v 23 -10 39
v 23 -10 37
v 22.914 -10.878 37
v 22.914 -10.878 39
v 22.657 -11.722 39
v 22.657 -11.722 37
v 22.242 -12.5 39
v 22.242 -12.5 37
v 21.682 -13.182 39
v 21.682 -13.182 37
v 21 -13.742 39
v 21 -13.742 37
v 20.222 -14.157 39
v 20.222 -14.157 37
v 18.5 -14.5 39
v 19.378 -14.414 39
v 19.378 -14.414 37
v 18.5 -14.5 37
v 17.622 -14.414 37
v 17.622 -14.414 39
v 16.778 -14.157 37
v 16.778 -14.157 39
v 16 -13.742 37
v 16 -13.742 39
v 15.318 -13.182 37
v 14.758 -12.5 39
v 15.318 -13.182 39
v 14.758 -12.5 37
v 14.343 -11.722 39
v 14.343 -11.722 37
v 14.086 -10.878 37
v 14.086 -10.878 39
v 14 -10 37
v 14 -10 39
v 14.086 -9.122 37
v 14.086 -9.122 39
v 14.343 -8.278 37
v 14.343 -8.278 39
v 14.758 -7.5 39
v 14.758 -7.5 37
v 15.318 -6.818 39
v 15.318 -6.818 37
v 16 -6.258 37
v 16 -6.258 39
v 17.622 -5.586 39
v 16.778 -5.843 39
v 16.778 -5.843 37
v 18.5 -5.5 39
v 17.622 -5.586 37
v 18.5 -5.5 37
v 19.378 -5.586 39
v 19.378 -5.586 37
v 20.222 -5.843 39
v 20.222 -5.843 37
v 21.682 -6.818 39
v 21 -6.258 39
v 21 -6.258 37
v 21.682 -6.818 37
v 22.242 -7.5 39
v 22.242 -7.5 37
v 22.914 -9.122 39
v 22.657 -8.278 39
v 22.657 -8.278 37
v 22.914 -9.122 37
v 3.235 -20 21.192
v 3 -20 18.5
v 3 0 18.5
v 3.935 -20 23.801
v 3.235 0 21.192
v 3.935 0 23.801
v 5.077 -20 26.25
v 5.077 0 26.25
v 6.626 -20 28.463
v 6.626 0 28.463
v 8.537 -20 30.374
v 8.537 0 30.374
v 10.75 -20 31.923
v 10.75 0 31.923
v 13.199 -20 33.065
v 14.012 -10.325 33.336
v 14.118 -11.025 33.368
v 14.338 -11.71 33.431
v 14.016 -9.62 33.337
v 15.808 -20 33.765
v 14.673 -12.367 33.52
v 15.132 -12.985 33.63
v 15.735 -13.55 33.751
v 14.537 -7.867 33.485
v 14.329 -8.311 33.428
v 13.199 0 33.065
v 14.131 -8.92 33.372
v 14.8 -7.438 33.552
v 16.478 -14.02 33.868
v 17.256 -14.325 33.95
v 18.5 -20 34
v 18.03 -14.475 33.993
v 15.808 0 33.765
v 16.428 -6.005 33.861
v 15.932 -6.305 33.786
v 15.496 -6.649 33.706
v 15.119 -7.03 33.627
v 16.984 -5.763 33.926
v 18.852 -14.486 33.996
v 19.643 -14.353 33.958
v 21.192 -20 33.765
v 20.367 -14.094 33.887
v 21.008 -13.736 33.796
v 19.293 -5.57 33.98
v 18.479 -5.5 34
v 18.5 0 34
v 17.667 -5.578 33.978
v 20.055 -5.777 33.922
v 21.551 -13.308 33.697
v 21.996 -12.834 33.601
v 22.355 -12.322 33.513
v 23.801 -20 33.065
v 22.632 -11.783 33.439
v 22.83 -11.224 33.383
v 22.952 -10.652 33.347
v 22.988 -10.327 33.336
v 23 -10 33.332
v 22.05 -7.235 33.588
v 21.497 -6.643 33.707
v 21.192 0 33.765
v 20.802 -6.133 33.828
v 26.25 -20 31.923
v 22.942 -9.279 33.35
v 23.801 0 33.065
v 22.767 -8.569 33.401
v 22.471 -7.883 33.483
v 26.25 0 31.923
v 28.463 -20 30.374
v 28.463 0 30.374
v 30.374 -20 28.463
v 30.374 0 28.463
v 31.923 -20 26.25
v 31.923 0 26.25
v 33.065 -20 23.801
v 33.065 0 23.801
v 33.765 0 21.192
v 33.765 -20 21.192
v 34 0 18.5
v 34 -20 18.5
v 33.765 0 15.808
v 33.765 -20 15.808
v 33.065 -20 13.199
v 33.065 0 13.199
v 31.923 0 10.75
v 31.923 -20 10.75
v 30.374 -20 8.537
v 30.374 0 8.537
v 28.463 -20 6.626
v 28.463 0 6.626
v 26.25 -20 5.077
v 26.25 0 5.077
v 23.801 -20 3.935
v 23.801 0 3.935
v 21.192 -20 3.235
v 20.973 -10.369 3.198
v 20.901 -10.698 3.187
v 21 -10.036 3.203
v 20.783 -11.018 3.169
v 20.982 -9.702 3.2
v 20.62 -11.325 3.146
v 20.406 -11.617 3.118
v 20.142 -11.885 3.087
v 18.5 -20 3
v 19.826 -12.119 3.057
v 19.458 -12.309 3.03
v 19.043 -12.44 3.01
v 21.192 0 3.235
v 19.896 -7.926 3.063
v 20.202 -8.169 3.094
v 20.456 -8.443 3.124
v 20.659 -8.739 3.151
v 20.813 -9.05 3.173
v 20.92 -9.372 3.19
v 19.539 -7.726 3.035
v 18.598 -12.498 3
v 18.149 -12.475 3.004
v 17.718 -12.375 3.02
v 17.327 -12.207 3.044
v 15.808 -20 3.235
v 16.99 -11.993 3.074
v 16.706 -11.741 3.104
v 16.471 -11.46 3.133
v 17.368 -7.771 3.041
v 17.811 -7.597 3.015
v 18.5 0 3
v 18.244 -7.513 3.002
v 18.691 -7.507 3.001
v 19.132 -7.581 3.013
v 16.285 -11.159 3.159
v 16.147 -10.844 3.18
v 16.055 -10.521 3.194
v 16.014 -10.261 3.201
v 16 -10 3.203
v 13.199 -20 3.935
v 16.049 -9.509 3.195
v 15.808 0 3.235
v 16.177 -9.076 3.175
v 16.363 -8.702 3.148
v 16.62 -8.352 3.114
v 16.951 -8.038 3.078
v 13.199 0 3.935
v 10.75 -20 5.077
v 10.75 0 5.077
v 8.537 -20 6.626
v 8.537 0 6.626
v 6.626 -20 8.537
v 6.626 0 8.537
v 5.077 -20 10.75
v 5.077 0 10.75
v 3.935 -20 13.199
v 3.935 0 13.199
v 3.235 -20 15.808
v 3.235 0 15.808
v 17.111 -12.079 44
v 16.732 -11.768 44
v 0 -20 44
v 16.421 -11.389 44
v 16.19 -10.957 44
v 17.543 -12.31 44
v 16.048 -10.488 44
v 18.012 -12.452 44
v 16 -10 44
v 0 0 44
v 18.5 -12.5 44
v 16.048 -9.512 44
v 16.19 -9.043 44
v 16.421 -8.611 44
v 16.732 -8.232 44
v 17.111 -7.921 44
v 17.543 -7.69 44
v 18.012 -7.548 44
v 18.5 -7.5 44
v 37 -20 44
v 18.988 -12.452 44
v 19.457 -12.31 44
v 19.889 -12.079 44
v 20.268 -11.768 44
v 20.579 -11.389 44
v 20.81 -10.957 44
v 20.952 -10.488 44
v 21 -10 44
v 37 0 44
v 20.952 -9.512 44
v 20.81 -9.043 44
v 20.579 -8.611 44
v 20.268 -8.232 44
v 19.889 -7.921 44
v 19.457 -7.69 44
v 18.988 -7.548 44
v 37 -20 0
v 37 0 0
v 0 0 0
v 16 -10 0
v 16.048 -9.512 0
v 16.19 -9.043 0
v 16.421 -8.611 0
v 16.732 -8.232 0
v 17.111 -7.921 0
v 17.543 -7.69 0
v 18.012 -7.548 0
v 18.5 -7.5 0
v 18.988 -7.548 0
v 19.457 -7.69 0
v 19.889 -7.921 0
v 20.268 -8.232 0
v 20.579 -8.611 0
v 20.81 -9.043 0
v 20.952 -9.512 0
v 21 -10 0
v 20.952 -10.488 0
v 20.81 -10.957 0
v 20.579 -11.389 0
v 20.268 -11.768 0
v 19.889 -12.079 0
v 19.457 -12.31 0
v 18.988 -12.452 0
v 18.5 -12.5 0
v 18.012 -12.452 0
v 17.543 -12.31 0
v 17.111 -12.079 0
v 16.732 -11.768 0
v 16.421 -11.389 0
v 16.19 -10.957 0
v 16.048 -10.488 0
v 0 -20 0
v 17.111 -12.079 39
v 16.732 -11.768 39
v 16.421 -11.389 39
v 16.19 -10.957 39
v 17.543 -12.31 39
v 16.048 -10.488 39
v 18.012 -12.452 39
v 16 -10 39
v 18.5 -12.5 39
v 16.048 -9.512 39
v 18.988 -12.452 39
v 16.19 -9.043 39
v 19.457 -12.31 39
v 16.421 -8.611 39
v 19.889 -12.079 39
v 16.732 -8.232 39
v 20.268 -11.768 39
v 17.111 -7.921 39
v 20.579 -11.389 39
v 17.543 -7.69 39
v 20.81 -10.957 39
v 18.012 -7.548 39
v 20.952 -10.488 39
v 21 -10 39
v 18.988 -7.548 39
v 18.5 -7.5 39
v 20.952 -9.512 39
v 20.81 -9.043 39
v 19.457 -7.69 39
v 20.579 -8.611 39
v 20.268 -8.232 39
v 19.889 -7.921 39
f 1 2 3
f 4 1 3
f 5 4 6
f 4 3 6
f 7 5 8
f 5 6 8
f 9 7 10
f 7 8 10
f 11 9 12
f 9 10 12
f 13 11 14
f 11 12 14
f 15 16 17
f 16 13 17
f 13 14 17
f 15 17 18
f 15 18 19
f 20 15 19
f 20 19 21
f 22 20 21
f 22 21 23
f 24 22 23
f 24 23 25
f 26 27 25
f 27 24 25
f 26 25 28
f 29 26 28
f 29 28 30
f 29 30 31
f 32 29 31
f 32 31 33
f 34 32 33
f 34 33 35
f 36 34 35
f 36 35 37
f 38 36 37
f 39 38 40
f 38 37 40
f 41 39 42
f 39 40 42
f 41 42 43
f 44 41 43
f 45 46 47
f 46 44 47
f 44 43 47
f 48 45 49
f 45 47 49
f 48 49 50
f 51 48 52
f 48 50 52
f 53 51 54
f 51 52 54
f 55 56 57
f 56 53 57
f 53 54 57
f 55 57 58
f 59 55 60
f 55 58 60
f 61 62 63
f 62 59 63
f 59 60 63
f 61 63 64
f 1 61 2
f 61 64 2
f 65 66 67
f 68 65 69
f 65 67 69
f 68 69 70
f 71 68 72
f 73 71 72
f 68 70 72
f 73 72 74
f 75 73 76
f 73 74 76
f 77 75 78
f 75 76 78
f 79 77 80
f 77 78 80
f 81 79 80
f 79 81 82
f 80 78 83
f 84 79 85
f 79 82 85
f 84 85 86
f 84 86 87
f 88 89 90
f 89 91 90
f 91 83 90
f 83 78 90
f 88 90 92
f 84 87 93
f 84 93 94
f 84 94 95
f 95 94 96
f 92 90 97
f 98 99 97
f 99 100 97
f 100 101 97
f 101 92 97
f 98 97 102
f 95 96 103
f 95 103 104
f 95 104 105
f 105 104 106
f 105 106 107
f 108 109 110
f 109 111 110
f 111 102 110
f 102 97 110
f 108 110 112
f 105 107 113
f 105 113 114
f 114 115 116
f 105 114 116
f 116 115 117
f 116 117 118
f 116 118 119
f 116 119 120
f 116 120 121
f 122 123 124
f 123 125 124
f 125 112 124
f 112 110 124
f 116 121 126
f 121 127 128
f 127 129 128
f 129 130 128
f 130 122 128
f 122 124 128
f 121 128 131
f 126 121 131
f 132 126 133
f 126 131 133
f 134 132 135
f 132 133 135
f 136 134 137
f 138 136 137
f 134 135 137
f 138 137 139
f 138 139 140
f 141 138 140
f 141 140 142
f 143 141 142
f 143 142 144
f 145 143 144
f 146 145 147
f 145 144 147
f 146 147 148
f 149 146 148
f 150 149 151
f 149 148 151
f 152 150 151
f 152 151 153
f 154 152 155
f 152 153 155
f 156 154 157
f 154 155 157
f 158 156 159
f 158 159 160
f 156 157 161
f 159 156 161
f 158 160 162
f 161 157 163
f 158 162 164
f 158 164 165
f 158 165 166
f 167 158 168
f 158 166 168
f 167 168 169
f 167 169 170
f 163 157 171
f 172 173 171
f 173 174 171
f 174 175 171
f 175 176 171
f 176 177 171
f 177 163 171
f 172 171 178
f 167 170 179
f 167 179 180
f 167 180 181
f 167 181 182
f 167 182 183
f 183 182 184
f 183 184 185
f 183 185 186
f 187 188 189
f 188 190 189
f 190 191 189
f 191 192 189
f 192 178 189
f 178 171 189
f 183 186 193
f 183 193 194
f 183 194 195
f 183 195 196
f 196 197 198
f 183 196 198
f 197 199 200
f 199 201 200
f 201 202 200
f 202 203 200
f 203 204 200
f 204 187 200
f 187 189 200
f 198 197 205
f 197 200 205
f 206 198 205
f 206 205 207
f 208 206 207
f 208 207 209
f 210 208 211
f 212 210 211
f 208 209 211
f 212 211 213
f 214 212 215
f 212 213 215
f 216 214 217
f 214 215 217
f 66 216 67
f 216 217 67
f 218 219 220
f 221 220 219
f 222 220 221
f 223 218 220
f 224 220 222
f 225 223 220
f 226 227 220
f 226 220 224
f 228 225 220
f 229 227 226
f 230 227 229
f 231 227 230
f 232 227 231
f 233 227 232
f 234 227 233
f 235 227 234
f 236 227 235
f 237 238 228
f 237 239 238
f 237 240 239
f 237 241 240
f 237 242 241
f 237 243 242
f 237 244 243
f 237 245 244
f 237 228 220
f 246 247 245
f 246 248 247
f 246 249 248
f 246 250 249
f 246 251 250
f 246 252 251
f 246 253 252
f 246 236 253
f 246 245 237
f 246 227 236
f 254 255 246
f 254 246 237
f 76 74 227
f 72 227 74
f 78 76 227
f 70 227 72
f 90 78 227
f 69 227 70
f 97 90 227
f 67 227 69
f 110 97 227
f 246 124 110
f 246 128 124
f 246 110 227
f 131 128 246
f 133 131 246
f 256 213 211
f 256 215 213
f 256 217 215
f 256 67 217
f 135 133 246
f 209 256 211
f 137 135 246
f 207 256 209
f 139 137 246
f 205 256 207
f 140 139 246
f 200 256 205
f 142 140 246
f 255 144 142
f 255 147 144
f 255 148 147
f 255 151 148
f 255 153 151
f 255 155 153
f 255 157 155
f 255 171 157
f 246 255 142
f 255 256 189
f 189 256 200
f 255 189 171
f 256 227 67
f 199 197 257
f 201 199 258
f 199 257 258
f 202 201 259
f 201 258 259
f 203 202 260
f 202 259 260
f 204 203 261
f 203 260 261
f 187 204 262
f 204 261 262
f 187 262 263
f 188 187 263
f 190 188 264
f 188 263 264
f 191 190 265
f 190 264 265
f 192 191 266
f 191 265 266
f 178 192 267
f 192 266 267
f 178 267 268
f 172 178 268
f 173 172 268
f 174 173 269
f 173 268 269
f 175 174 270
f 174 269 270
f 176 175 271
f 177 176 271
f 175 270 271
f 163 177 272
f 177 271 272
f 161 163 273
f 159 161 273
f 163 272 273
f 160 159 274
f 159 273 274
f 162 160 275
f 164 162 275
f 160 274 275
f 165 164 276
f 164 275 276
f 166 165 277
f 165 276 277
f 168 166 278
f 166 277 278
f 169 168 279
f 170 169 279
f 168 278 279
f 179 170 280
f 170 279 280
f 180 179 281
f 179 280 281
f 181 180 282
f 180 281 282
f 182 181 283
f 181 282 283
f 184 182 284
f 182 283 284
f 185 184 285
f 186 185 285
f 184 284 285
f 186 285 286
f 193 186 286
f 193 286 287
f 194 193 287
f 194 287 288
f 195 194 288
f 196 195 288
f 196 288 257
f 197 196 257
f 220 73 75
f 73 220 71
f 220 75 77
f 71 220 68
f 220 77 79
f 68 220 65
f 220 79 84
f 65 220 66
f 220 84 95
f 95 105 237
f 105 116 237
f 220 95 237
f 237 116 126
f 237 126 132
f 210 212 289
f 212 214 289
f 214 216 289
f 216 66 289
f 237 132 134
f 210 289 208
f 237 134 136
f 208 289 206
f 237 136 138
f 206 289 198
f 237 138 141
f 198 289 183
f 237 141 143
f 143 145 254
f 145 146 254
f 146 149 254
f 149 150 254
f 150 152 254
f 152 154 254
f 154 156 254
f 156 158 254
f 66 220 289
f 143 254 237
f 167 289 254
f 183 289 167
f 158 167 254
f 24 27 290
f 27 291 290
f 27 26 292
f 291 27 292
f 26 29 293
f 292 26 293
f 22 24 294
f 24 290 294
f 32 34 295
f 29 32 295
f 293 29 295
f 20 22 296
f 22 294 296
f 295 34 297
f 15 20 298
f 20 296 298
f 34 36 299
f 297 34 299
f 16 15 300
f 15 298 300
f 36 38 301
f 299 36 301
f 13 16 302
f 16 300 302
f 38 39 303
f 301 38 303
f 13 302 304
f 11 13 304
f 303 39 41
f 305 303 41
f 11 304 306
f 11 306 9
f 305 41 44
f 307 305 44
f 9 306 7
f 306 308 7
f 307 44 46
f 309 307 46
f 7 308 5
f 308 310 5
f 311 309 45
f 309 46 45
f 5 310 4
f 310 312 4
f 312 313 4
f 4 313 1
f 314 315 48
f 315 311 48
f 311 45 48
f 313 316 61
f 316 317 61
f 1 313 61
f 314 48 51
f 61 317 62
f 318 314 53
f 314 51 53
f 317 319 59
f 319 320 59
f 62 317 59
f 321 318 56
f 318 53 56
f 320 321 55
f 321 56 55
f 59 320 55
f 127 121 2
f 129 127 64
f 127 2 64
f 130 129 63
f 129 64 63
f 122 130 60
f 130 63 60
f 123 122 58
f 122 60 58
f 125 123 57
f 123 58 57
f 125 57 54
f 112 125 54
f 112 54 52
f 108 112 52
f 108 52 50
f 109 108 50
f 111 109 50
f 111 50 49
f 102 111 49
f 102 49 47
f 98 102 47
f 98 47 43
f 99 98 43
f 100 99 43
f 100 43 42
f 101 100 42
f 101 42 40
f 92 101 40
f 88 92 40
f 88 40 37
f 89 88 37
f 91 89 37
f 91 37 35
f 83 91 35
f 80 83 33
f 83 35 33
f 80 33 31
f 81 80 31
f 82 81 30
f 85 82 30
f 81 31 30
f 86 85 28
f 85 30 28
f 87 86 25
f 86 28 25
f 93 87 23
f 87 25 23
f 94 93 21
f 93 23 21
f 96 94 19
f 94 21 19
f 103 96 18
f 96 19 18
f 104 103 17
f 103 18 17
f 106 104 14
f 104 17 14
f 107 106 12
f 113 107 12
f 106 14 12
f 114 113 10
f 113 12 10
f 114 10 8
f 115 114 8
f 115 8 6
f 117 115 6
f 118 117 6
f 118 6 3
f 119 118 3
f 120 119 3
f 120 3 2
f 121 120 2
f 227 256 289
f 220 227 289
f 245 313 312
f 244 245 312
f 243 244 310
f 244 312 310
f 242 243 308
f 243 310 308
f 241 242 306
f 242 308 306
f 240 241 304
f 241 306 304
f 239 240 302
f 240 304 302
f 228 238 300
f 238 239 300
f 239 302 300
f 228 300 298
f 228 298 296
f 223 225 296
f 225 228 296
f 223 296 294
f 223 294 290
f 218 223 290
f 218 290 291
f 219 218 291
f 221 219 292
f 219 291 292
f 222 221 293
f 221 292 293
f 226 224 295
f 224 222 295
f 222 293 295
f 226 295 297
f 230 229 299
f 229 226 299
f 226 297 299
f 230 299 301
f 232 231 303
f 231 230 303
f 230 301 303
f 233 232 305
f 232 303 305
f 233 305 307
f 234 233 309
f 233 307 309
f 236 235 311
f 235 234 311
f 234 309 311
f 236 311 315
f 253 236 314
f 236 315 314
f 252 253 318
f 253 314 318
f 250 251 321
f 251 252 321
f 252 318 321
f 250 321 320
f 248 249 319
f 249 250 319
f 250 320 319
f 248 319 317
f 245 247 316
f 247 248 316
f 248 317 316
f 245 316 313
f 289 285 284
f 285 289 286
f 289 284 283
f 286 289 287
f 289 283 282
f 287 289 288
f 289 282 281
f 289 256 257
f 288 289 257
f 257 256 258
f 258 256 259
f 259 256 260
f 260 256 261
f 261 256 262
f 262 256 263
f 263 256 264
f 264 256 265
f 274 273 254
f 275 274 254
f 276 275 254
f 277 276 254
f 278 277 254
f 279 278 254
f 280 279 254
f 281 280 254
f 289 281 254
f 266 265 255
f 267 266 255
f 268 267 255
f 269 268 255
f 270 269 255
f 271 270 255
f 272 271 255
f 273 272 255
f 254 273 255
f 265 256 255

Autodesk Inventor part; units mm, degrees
ref_plane "YZ Plane" through (0, 0, 0) normal (1, 0, 0) x (0, 1, 0)
ref_plane "XZ Plane" through (0, 0, 0) normal (0, 1, 0) x (-1, 0, 0)
ref_plane "XY Plane" through (0, 0, 0) normal (0, 0, 1) x (1, 0, 0)
sketch "Sketch1" plane through (0, 0, 0) normal (0, 1, 0) x (-1, 0, 0)
  line L0 (0, 0) -> (-37, 0)
  line L1 (-37, 0) -> (-37, 37)
  line L2 (-37, 37) -> (0, 37)
  line L3 (0, 37) -> (0, 0)
  circle A0 centre (-18.5, 18.5) radius 15.5
  point P0 (-18.5, 0)
  dimension "d0" = 37
  dimension "d1" = 37
  dimension "d2" = 18.5
  dimension "d3" = 18.5
  dimension "d4" = 31
extrude "Extrusion1" add sketch "Sketch1" against normal blind 20
sketch "Sketch3" plane through (0, 0, 37) normal (0, 0, 1) x (1, 0, 0)
  circle A0 centre (18.5, -10) radius 4.5
  line L0 (37, 0) -> (37, -20) projected
  point P0 (0, 0)
  dimension "d8" = 9
  dimension "d18" = 18.5
extrude "Extrusion2" cut sketch "Sketch3" against normal blind 5
sketch "Sketch4" plane through (37, 0, 0) normal (0, 0, -1) x (-1, 0, 0)
  circle A0 centre (18.5, -10) radius 4.5 projected
  circle A1 centre (18.5, -10) radius 2.5
  point P0 (37, 0)
  dimension "d11" = 5
extrude "Extrusion3" cut sketch "Sketch4" against normal blind 5 contours A1
sketch "Sketch5" plane through (0, 0, 37) normal (0, 0, 1) x (1, 0, 0)
  line L0 (37, 0) -> (0, 0) projected
  line L1 (0, -20) -> (37, -20) projected
  line L2 (0, 0) -> (37, 0)
  line L3 (37, 0) -> (37, -20)
  line L4 (37, -20) -> (0, -20)
  line L5 (0, -20) -> (0, 0)
  line L6 (0, 0) -> (0, -20) projected
  line L7 (0, 0) -> (37, 0)
  line L8 (37, 0) -> (37, -20)
  line L9 (37, -20) -> (0, -20)
  line L10 (0, -20) -> (0, 0)
  circle A0 centre (18.5, -10) radius 4.5
  dimension "d19" = 18.5
extrude "Extrusion4" add sketch "Sketch5" along normal blind 2
sketch "Sketch6" plane through (0, 0, 39) normal (0, 0, 1) x (1, 0, 0)
  line L0 (0, 0) -> (0, -20) projected
  line L1 (0, -20) -> (37, -20) projected
  line L2 (0, 0) -> (37, 0)
  line L3 (37, 0) -> (37, -20)
  line L4 (37, -20) -> (0, -20)
  line L5 (0, -20) -> (0, 0)
  circle A0 centre (18.5, -10) radius 2.5
  dimension "d20" = 18.5
extrude "Extrusion5" add sketch "Sketch6" along normal blind 5
equation "\"d0\" = d1"
equation "\"d2\" = 0.5 * d1"
equation "\"d3\" = 0.5 * d0"
properties part number "welco mount v03"
